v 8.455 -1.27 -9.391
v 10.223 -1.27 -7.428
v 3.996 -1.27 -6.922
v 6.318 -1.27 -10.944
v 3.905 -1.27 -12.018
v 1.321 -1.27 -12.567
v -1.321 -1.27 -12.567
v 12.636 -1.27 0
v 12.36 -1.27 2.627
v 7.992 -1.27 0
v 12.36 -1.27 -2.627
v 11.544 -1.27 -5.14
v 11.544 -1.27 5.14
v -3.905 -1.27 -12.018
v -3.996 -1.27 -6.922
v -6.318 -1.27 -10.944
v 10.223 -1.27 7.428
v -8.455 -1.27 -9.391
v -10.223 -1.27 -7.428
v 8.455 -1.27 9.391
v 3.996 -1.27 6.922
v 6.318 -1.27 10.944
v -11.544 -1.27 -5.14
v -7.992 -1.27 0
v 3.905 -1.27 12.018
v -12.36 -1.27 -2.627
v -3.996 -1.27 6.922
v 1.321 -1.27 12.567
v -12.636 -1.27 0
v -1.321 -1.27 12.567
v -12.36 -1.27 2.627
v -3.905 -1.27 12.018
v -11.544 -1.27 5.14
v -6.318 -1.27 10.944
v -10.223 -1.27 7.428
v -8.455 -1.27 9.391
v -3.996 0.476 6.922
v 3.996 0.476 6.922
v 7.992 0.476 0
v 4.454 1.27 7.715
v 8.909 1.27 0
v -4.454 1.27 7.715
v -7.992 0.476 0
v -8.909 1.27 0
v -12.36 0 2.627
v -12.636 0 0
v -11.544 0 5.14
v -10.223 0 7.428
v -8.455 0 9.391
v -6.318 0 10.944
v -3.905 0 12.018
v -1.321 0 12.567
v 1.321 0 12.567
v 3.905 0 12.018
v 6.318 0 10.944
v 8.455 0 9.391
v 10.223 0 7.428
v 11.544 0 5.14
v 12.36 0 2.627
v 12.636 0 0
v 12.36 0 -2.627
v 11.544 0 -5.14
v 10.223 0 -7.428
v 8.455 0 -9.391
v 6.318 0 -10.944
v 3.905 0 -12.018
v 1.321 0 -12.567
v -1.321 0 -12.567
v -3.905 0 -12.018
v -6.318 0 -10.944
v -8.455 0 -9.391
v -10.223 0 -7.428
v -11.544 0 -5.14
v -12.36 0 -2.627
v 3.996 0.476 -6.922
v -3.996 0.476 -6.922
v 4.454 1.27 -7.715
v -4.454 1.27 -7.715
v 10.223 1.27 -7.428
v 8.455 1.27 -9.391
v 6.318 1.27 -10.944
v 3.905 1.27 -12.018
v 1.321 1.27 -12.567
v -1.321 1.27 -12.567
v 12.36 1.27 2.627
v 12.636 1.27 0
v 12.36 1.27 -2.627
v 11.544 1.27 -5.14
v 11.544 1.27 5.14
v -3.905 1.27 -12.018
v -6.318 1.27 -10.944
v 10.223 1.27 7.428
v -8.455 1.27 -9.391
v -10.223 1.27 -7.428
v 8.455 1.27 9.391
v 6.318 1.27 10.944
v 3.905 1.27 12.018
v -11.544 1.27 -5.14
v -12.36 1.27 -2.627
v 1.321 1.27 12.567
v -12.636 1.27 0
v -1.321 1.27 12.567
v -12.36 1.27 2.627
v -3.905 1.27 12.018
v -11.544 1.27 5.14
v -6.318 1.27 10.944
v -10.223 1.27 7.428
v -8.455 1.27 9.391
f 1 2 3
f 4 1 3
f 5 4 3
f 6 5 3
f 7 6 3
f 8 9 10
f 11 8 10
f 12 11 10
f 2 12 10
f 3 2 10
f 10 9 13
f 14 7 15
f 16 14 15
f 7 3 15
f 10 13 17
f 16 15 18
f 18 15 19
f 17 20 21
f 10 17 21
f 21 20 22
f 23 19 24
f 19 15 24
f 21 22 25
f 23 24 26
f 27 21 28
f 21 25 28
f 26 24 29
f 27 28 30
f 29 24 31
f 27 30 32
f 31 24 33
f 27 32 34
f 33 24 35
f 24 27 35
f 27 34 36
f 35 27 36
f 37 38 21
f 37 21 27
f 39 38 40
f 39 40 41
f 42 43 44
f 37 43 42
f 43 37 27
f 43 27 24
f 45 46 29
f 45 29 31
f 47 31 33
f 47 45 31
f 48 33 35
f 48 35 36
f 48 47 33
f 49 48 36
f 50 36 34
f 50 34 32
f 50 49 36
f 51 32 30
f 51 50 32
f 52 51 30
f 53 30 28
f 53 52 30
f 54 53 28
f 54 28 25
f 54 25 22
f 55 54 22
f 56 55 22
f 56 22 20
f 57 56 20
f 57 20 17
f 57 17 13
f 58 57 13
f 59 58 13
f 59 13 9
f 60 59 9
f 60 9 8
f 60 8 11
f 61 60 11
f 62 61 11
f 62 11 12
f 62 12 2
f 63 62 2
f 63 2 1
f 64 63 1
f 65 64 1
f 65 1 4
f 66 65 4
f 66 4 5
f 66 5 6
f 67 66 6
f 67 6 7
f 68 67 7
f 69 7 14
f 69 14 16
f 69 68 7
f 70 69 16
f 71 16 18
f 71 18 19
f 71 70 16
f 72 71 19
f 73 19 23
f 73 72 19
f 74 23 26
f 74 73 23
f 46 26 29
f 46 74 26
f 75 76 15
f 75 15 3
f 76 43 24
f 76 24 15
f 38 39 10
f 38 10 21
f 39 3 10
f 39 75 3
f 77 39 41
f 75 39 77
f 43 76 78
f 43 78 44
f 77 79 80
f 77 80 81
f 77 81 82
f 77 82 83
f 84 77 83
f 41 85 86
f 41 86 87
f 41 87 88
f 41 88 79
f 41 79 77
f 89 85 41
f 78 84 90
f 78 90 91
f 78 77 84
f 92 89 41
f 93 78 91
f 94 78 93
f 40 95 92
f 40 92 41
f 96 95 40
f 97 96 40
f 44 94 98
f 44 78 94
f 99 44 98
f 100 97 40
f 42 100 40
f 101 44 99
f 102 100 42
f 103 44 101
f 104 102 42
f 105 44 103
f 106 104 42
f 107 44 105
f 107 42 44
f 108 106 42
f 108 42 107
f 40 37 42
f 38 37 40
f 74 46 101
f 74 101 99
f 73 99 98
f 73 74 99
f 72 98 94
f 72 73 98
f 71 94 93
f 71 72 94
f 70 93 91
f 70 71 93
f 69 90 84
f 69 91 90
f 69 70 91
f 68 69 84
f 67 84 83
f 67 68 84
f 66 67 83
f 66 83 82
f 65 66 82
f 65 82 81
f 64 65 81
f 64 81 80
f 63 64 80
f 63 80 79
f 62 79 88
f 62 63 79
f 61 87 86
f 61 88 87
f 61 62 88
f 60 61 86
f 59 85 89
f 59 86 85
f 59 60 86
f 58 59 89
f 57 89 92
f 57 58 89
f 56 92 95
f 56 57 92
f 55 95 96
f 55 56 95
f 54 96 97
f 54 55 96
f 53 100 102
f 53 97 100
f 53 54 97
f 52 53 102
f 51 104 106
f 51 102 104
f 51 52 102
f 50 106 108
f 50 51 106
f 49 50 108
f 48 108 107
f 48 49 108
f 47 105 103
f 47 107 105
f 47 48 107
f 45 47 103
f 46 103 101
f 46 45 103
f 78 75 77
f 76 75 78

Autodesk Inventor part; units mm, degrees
ref_plane "YZ Plane" through (0, 0, 0) normal (1, 0, 0) x (0, 1, 0)
ref_plane "XZ Plane" through (0, 0, 0) normal (0, 1, 0) x (-1, 0, 0)
ref_plane "XY Plane" through (0, 0, 0) normal (0, 0, 1) x (1, 0, 0)
sketch "Sketch9" plane through (0, 0, 0) normal (0, 1, 0) x (-1, 0, 0)
  circle A0 centre (0, 0) radius 12.6365
  dimension "d53" = 25.273
extrude "Extrusion6" add sketch "Sketch9" along normal mid plane 2.54
sketch "Sketch15" plane through (0, 1.27, 0) normal (0, 1, 0) x (1, 0, 0)
  line L0 (7.9923, 0) -> (3.9961, -6.9215)
  line L1 (3.9961, -6.9215) -> (-3.9961, -6.9215)
  line L2 (-3.9961, -6.9215) -> (-7.9923, 0)
  line L3 (-7.9923, 0) -> (-3.9961, 6.9215)
  line L4 (-3.9961, 6.9215) -> (3.9961, 6.9215)
  line L5 (3.9961, 6.9215) -> (7.9923, 0)
  point P0 (0, 0)
  point P1 (0, 0)
  dimension "d82" = 13.843
extrude "Extrusion11" cut sketch "Sketch15" against normal through all
chamfer "Chamfer7" distance 0.7937 angle 45 6 edges at (-5.9942, 1.27, -3.4607) (-5.9942, 1.27, 3.4608) (0, 1.27, 6.9215) (5.9942, 1.27, 3.4607) (5.9942, 1.27, -3.4608) (0, 1.27, -6.9215)
equation "\"d82\" = hexDiameter"
equation "\"holeForString\" = stringDiameter + clearanceForString"
equation "\"stringDiameter\" = 3.048"
equation "\"clearanceForString\" = 2.032"
equation "\"spoolHeightWithoutSpacer\" = 69.85"
equation "\"hexShaftDiameter\" = 12.7"
equation "\"clearanceForHexShaft\" = 1.143"
equation "\"hexDiameter\" = hexShaftDiameter + clearanceForHexShaft"
equation "\"supportChannels\" = 3.81"
equation "\"spoolInteriorDiameter\" = 38.1"
equation "\"spoolInteriroRadius\" = 0.5 * spoolInteriorDiameter"
equation "\"spoolExteriorDiameter\" = 88.9"
equation "\"spoolExteriorRadius\" = 0.5 * spoolExteriorDiameter"
equation "\"spoolFiletRadius\" = 0.5 * supportChannels"
equation "\"holeCenter\" = 0.25 * spoolHeightWithoutSpacer - 0.75 * supportChannels"
equation "\"hexHoleChamfer\" = 1.5875"
equation "\"stringHoleCenterFromHexShaft\" = 0.5 * hexDiameter + 0.5 * holeForString"
equation "\"textCircleDiameter\" = 0.75 * spoolExteriorDiameter"
equation "\"textHeight\" = 6.096"
equation "\"textDepth\" = 1.27"
equation "\"stringHoleChamfer\" = 4.7625"
equation "\"spoolTotalHeight\" = 76.2"
equation "\"spaceHeight\" = spoolTotalHeight - spoolHeightWithoutSpacer"
equation "\"spacerDiameter\" = 24.13"
properties part number "spacerForEndV08" material "PC/ABS Plastic"
